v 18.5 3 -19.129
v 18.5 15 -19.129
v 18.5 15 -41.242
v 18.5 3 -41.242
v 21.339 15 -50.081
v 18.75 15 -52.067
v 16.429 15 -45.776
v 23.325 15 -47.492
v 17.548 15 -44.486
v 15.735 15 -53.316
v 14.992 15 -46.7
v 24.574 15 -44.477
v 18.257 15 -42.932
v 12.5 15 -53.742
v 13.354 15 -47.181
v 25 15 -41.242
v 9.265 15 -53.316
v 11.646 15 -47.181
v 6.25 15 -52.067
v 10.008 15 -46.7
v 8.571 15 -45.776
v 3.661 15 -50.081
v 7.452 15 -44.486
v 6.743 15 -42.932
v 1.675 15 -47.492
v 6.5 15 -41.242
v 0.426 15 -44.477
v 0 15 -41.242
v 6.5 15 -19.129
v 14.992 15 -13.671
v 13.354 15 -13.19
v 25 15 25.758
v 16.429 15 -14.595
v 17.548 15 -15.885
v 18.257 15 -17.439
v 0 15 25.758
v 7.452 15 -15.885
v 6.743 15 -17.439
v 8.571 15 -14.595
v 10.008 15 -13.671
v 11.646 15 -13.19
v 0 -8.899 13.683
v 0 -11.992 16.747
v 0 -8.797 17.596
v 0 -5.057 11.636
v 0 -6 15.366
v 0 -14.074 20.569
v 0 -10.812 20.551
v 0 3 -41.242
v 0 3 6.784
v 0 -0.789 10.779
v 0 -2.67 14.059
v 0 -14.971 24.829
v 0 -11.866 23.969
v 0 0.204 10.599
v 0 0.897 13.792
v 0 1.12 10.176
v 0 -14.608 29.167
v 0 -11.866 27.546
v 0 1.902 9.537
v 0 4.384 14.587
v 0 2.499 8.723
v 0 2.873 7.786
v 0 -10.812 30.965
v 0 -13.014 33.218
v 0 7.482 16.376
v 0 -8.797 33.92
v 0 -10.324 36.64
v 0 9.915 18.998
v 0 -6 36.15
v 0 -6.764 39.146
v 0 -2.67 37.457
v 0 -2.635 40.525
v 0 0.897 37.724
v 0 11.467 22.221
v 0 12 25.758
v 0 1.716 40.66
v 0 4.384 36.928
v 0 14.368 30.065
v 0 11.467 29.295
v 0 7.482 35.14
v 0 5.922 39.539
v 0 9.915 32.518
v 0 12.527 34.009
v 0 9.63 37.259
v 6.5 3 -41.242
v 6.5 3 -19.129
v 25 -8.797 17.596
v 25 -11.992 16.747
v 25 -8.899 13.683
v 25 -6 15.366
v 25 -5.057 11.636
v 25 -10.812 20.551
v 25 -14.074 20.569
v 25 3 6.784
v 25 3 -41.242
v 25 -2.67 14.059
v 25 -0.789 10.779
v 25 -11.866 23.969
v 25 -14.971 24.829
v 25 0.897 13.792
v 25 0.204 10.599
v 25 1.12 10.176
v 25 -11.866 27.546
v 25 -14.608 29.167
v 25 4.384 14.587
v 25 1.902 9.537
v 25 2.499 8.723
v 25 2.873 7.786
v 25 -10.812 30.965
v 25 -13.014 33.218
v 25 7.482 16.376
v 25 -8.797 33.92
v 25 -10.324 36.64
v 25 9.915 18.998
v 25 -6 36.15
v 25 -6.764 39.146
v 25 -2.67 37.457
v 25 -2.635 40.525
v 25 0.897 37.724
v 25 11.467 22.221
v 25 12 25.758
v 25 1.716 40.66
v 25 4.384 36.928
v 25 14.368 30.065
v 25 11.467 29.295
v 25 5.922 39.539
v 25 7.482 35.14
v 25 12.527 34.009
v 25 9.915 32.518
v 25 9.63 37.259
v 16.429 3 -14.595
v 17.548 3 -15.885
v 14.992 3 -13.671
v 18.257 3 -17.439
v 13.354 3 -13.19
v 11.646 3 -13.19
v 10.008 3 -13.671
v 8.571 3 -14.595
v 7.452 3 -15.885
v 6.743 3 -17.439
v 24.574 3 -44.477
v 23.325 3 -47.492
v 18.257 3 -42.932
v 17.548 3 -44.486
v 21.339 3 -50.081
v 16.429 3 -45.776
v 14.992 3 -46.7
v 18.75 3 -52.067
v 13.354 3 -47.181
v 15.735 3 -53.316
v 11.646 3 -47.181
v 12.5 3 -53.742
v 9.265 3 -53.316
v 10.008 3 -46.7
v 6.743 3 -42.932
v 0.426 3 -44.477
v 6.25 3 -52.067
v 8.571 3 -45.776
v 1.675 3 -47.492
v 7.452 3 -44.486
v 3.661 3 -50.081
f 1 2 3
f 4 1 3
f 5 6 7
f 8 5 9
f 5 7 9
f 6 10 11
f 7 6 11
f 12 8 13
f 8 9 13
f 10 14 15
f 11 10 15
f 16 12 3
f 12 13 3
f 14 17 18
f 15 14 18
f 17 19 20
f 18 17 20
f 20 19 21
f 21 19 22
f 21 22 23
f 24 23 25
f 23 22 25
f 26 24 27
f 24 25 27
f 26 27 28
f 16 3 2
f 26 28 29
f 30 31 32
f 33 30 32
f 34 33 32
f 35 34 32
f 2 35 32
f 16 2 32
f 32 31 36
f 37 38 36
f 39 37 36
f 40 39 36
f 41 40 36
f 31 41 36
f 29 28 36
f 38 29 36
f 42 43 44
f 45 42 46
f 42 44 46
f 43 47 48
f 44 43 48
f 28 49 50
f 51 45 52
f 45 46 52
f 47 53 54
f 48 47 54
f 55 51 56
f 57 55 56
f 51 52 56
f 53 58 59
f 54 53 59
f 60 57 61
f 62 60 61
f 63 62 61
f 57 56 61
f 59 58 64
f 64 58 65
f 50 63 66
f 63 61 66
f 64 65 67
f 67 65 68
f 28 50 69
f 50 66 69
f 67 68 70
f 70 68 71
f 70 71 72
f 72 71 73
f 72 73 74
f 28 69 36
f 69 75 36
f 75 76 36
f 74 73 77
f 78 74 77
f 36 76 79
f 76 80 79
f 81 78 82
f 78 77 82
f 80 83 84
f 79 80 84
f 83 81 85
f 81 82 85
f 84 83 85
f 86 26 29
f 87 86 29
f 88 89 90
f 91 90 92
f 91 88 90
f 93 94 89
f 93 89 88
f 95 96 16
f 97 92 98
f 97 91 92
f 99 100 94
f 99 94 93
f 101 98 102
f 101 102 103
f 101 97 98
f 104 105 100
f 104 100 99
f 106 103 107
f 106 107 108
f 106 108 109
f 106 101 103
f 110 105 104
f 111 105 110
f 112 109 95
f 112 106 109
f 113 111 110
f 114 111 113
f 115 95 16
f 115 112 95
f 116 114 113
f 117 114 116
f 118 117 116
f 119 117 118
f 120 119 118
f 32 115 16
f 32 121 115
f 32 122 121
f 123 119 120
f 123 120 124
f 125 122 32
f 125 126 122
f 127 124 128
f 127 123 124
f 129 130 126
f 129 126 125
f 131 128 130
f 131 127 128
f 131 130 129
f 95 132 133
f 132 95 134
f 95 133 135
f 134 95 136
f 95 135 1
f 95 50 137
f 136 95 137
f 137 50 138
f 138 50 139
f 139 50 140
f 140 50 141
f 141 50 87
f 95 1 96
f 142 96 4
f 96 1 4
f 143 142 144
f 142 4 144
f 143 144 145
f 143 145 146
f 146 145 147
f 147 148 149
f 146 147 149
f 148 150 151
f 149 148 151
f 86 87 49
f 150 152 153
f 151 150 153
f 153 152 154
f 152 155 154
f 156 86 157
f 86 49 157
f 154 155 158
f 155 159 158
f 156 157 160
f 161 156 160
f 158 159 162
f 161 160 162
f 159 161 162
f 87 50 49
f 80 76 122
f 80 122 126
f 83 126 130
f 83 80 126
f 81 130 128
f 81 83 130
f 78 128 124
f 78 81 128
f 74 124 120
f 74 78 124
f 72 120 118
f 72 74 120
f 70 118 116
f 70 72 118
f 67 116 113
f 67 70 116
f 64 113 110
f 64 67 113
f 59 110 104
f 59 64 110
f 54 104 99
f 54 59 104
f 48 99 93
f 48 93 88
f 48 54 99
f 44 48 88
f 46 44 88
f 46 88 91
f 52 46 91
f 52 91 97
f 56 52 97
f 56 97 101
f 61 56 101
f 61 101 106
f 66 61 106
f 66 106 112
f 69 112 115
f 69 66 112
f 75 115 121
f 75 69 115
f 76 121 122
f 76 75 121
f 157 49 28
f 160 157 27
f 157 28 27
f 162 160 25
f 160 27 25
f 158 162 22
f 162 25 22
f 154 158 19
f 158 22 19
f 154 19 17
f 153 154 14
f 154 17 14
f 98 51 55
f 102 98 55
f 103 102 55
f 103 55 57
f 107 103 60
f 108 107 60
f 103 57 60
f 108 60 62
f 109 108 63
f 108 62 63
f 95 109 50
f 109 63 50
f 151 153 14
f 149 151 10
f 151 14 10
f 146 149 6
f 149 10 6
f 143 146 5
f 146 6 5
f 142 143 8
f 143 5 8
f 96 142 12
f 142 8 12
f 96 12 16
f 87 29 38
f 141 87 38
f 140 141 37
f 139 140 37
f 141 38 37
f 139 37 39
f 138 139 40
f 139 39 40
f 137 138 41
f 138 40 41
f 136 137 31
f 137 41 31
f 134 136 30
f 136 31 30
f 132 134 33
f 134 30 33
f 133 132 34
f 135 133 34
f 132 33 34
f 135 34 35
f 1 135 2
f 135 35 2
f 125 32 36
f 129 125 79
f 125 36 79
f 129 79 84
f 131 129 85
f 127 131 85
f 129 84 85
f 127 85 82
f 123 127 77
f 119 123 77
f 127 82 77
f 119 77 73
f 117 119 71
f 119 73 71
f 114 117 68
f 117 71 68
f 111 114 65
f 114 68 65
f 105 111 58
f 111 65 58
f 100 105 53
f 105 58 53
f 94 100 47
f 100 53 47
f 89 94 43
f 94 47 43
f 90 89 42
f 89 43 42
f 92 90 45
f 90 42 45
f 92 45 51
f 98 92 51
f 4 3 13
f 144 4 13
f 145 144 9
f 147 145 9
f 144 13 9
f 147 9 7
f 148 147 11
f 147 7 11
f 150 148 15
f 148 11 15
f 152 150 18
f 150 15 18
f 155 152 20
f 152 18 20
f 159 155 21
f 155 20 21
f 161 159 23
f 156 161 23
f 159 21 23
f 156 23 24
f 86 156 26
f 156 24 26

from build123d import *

# Parameters (mm, degrees)
F0_R     = 12
F1_DEPTH = 25
F3_DEPTH = 25


with BuildPart() as f1:
    # F0 (on Right) → F1 (new body)
    with BuildSketch(Plane.YZ):
        with BuildLine():
            Line((15, -53.741885), (15, 25.757949))
            ThreePointArc((15, 25.757949), (-10.323708, 36.640093), (-0.789474, 10.778739))
            ThreePointArc((-0.789474, 10.778739), (1.901905, 9.537272), (3, 6.784283))
            Line((3, 6.784283), (3, -53.741885))
            Line((3, -53.741885), (15, -53.741885))
        make_face()
        with Locations((0, 25.757949)):
            Circle(F0_R, mode=Mode.SUBTRACT)
    extrude(amount=F1_DEPTH)

    # F2 (on face) → F3 (cut)
    with BuildSketch(Plane(origin=(0, 15, 0), x_dir=(-1, 0, 0), z_dir=(0, 1, 0))):
        with BuildLine():
            Line((0, -53.741885), (0, -41.241885))
            ThreePointArc((0, -41.241885), (-3.661165, -50.080719), (-12.5, -53.741885))
            Line((-12.5, -53.741885), (0, -53.741885))
        make_face()
        with BuildLine():
            Line((-25, -53.741885), (-12.5, -53.741885))
            ThreePointArc((-12.5, -53.741885), (-21.338835, -50.080719), (-25, -41.241885))
            Line((-25, -41.241885), (-25, -53.741885))
        make_face()
        with BuildLine():
            Line((-6.5, -41.241885), (-6.5, -19.129273))
            ThreePointArc((-6.5, -19.129273), (-12.5, -13.129273), (-18.5, -19.129273))
            Line((-18.5, -19.129273), (-18.5, -41.241885))
            ThreePointArc((-18.5, -41.241885), (-12.5, -47.241885), (-6.5, -41.241885))
        make_face()
    extrude(amount=-F3_DEPTH, mode=Mode.SUBTRACT)


solid = f1.part
